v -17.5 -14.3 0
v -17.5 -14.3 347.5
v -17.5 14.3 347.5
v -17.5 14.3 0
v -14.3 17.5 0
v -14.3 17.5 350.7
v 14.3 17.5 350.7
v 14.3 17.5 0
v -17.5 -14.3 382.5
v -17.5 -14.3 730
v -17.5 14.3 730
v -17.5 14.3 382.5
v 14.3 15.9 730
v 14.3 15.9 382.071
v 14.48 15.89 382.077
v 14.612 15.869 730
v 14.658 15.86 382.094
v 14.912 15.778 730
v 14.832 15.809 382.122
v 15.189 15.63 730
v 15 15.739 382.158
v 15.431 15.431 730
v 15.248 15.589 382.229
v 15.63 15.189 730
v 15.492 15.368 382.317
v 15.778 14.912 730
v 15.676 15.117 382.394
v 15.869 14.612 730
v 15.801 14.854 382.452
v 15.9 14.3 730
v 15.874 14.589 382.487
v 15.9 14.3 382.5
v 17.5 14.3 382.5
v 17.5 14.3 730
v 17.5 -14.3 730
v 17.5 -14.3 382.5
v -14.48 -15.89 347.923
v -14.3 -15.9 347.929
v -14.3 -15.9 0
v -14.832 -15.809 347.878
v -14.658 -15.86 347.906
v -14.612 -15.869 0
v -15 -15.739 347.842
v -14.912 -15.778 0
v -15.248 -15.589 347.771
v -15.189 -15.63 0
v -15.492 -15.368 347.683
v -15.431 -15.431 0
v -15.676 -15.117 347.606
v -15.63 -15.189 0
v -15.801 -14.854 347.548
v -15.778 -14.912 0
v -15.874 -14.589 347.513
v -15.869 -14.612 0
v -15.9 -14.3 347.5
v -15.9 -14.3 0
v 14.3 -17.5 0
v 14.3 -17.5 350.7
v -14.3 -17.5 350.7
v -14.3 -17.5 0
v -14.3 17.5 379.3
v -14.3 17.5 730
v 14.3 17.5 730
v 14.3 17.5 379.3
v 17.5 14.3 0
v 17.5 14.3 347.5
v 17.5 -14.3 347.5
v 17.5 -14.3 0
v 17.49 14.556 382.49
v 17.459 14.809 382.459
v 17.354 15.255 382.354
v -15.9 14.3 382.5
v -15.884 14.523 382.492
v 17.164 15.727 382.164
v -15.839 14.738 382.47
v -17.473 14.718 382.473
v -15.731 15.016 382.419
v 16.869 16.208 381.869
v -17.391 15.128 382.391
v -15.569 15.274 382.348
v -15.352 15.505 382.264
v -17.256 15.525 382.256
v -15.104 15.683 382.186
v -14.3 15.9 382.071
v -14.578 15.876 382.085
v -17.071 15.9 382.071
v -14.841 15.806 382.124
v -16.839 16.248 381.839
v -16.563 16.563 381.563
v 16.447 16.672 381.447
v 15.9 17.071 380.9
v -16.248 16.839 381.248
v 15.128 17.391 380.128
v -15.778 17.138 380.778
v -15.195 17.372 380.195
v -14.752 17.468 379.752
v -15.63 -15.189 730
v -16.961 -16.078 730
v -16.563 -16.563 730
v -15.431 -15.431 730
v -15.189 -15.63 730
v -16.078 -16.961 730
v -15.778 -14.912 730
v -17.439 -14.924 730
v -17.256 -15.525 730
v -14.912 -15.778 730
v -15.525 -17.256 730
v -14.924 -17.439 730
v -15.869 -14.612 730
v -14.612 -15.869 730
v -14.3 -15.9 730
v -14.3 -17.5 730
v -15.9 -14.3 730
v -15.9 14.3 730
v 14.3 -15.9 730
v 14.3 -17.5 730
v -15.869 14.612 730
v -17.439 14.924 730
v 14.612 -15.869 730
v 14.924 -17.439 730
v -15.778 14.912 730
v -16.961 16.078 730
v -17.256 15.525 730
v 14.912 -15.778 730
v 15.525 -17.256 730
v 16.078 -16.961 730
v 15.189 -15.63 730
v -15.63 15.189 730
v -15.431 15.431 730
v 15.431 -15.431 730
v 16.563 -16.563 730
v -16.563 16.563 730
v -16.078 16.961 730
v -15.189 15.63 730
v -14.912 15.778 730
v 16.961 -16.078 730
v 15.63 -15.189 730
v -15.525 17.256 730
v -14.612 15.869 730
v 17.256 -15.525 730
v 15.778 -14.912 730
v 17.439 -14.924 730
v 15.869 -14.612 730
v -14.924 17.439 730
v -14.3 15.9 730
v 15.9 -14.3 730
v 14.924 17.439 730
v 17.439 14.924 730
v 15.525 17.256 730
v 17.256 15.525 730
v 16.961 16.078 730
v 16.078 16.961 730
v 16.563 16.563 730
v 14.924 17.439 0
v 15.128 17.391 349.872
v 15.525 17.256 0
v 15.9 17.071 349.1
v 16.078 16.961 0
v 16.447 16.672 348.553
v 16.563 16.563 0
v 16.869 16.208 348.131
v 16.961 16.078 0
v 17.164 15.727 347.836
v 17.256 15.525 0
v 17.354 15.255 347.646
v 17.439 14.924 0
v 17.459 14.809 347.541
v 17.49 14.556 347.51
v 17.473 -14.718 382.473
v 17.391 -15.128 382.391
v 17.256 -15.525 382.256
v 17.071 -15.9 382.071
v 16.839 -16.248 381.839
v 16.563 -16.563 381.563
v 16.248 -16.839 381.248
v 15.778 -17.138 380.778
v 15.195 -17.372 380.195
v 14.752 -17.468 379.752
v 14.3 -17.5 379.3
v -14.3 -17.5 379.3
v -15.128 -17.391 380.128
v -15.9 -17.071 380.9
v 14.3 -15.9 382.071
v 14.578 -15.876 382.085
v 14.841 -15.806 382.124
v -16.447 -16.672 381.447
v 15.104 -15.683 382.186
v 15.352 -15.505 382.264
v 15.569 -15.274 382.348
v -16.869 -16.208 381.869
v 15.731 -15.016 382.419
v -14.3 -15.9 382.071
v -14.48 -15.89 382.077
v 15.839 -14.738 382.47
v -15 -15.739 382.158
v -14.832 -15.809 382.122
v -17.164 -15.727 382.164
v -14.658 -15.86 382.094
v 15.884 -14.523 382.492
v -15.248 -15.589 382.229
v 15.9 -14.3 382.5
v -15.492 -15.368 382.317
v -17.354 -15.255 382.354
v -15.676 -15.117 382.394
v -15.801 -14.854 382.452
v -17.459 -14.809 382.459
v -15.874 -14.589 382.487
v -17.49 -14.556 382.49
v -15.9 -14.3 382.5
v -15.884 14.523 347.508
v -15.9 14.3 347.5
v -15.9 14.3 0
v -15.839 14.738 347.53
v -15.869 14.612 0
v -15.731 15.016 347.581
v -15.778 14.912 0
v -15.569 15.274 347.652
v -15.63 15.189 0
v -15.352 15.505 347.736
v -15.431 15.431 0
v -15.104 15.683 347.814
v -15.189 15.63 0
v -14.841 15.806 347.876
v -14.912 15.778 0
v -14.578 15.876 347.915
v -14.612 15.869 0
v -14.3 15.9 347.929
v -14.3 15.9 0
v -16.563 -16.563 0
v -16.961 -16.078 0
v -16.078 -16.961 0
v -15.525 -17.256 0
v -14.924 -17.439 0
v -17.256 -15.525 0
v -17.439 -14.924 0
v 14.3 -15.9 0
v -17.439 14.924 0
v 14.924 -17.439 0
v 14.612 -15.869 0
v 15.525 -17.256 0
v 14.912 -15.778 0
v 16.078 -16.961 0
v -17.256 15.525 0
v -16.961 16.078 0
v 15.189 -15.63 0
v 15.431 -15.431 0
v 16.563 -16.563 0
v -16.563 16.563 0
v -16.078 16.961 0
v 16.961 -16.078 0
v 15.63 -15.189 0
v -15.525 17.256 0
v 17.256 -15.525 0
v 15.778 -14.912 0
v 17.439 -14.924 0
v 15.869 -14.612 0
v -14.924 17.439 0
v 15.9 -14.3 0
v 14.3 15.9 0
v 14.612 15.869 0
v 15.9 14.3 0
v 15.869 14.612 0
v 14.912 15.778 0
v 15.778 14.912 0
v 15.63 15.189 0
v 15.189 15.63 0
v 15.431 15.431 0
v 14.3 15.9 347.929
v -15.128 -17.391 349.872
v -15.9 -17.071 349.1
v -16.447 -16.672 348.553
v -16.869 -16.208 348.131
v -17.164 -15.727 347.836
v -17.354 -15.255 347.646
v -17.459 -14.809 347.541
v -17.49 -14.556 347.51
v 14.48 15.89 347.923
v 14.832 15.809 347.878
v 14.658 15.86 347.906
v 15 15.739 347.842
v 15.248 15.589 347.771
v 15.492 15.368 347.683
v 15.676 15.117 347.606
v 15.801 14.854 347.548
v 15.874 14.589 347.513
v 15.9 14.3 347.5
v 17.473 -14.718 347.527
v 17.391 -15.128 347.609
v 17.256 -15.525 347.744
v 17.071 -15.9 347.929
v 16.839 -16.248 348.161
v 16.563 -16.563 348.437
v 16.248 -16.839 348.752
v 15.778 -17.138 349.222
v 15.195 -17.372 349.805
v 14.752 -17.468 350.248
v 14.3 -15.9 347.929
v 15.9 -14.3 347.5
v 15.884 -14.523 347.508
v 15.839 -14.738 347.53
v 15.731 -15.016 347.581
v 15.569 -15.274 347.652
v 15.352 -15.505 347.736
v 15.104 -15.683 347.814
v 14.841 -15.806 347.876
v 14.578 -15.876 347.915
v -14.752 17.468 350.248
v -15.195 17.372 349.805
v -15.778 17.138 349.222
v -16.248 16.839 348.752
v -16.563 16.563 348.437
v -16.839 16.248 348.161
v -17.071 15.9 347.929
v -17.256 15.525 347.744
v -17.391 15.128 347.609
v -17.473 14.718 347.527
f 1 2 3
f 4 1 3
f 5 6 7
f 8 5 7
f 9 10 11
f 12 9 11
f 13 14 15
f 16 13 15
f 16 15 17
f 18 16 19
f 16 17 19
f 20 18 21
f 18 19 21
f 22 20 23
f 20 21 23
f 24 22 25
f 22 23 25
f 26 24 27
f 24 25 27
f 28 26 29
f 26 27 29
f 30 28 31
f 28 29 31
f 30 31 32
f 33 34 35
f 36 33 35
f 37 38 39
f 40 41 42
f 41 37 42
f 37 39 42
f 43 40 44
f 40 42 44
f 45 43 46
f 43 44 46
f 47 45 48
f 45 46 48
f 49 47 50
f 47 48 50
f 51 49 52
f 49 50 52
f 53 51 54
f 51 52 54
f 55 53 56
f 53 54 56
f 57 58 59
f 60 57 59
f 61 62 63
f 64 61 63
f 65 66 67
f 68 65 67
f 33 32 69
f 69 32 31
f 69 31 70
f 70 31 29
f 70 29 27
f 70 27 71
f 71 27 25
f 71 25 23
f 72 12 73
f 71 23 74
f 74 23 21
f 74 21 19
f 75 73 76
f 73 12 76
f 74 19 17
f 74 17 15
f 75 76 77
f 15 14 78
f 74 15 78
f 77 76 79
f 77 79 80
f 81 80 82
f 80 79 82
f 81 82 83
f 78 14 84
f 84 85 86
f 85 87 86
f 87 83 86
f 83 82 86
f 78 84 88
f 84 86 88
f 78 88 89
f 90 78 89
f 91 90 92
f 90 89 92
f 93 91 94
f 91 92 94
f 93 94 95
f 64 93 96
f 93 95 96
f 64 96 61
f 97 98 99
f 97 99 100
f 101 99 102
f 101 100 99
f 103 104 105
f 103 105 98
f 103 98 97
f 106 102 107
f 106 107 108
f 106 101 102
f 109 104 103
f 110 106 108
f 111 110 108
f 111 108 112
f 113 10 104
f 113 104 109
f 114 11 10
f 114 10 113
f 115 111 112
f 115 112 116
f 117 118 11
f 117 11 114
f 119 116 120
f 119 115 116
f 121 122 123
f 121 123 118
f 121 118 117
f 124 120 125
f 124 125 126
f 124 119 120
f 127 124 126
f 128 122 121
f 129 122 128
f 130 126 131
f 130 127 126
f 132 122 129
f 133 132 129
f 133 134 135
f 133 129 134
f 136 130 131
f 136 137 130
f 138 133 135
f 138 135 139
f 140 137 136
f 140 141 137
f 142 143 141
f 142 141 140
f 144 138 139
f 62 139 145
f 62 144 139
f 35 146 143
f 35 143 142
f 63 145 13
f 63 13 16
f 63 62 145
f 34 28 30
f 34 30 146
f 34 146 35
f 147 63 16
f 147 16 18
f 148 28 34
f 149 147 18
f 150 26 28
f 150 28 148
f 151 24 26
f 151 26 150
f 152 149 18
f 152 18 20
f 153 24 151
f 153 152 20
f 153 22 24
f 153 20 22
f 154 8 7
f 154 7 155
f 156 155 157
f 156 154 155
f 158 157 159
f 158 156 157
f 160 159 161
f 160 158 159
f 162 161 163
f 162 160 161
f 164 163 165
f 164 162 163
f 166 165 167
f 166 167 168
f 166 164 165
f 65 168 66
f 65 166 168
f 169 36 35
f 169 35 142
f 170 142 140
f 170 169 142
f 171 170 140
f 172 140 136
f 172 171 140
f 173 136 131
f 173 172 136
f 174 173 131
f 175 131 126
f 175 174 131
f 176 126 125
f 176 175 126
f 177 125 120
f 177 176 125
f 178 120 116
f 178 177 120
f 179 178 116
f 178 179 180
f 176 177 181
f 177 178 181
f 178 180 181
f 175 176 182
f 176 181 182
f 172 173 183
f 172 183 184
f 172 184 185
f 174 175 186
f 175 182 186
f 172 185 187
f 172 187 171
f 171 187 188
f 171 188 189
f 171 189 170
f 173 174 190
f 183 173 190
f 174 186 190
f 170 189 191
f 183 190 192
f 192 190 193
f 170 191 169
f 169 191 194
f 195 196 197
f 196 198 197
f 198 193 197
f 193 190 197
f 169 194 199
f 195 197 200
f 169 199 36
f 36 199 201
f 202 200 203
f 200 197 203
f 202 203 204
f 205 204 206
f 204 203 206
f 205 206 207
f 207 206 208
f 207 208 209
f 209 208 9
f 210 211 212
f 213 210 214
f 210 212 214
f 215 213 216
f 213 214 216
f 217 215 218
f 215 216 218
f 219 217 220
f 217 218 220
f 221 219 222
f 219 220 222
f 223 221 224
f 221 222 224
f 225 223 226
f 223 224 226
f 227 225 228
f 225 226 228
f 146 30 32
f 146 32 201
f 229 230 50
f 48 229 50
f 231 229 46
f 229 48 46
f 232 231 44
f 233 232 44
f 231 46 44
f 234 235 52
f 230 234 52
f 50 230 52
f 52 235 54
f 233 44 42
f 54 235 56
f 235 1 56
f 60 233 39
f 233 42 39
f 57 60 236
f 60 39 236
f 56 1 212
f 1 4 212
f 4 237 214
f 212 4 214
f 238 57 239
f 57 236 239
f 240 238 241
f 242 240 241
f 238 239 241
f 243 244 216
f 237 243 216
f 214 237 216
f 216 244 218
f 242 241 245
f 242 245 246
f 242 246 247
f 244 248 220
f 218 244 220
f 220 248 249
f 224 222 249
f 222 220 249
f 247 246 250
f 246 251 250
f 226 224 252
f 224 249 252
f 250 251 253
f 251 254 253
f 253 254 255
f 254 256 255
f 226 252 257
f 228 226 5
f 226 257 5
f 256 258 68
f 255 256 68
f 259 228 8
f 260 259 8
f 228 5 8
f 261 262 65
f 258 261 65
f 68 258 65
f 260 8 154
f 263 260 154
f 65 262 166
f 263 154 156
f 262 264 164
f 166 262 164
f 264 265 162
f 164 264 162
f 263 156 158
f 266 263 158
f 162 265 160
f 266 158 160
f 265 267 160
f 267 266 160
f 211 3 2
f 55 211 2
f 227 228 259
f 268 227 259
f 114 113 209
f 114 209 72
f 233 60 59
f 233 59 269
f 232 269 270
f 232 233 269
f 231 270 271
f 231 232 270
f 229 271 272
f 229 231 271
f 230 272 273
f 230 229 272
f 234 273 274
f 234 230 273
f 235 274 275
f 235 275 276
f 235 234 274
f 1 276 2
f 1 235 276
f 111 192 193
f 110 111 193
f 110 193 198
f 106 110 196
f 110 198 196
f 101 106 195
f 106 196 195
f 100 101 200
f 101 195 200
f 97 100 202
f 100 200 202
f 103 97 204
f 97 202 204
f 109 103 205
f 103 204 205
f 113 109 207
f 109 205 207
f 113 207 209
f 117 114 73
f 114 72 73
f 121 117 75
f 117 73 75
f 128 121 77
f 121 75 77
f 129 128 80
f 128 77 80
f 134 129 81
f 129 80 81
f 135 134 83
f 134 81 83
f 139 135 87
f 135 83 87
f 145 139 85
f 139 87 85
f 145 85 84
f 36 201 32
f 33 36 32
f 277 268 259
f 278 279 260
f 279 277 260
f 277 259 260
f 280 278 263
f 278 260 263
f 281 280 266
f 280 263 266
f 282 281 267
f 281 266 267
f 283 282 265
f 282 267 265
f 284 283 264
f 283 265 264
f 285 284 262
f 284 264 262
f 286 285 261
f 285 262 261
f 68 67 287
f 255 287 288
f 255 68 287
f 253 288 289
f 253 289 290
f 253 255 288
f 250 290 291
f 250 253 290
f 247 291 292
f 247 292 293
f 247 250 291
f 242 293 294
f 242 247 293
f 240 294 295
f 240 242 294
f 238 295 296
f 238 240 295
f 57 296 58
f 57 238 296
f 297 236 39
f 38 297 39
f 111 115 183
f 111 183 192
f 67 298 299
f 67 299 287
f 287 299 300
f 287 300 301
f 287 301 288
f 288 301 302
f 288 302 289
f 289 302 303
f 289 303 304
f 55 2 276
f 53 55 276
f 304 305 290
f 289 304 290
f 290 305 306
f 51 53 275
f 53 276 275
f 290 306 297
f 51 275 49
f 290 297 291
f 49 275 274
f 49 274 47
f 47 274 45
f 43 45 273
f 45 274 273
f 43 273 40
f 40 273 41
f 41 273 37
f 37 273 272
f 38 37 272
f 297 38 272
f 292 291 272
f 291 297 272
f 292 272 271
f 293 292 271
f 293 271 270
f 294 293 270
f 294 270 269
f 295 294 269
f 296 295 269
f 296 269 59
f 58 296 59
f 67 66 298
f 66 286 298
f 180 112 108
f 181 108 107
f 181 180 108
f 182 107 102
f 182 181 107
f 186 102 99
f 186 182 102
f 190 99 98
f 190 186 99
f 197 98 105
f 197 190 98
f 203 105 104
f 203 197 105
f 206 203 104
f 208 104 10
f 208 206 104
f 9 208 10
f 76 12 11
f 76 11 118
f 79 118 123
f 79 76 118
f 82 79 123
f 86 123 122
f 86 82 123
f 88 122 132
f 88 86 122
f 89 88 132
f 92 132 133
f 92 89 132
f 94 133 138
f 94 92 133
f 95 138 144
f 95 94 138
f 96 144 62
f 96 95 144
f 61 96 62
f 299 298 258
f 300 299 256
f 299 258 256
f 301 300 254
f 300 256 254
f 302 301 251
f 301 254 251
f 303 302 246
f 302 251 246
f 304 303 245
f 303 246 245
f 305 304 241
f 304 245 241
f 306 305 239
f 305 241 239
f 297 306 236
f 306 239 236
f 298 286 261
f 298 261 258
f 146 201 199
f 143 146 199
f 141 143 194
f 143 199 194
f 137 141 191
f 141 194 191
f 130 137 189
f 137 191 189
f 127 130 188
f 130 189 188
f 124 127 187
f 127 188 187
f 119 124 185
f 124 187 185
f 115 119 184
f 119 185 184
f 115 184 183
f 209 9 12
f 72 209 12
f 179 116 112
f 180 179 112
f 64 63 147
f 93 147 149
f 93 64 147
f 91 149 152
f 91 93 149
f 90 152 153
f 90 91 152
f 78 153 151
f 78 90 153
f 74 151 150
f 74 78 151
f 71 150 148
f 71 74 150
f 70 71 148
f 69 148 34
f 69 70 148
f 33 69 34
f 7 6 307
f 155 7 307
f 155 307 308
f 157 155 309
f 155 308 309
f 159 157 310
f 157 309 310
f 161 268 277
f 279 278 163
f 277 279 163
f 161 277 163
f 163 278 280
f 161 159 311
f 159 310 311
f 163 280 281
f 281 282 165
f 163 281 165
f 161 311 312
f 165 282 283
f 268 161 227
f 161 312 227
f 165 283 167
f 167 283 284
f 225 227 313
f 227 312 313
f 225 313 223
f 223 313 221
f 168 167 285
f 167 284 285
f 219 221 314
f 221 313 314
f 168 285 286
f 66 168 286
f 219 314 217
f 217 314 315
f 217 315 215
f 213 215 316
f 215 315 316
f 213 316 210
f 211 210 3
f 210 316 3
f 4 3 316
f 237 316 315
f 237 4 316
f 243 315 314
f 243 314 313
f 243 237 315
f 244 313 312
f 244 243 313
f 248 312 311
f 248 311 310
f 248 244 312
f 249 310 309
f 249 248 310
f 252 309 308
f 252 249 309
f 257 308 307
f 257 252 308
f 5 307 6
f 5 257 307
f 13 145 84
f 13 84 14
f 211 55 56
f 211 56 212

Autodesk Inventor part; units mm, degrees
ref_plane "Start plane" through (0, 0, 0) normal (0, 0, 1) x (1, 0, 0)
ref_plane "End plane" through (0, 0, 730) normal (0, 0, 1) x (1, 0, 0)
sketch "Sketch" plane through (0, 0, 0) normal (0, 0, 1) x (1, 0, 0)
  line L0 (-17.5, -14.3) -> (-17.5, 14.3)
  line L1 (-14.3, 17.5) -> (14.3, 17.5)
  line L2 (17.5, 14.3) -> (17.5, -14.3)
  line L3 (14.3, -17.5) -> (-14.3, -17.5)
  arc A0 (-17.5, -14.3) -> (-14.3, -17.5) centre (-14.3, -14.3) ccw
  arc A1 (-14.3, 17.5) -> (-17.5, 14.3) centre (-14.3, 14.3) ccw
  arc A2 (17.5, 14.3) -> (14.3, 17.5) centre (14.3, 14.3) ccw
  arc A3 (14.3, -17.5) -> (17.5, -14.3) centre (14.3, -14.3) ccw
  arc A4 (-14.3, 15.9) -> (-15.9, 14.3) centre (-14.3, 14.3) ccw
  line L4 (-14.3, 15.9) -> (14.3, 15.9)
  arc A5 (15.9, 14.3) -> (14.3, 15.9) centre (14.3, 14.3) ccw
  line L5 (15.9, 14.3) -> (15.9, -14.3)
  arc A6 (14.3, -15.9) -> (15.9, -14.3) centre (14.3, -14.3) ccw
  line L6 (14.3, -15.9) -> (-14.3, -15.9)
  arc A7 (-15.9, -14.3) -> (-14.3, -15.9) centre (-14.3, -14.3) ccw
  line L7 (-15.9, -14.3) -> (-15.9, 14.3)
  line L8 (0, 25.4278) -> (0, -25.4278) construction
  line L9 (-25.4278, 0) -> (25.4278, 0) construction
  dimension "d7" = 3.2
  dimension "d10" = 35
  dimension "d11" = 35
  dimension "d12" = 1.6
  dimension "d15" = 17.5
  dimension "d16" = 17.5
extrude "Body" add sketch "Sketch" along normal up to surface (730 mm away) from surface at 0
sketch "Sketch3" plane through (0, 0, 0) normal (0, 0, 1) x (1, 0, 0)
  line L0 (0, 0) -> (10, 0)
ref_plane "Work Plane3" through (0, 0, 0) normal (0, -1, 0) x (1, 0, 0)
sketch "Sketch4" plane through (0, 0, 0) normal (0, -1, 0) x (1, 0, 0)
  line L0 (-2, 0) -> (12, 0)
  line L1 (-2, 730) -> (12, 730)
  dimension "d18" = 730
ref_plane "Work Plane4" through (-215, 0, 365) normal (1, 0, 0) x (0, 0, -1)
ref_plane "Work Plane5" through (215, 0, 365) normal (1, 0, 0) x (0, 0, -1)
ref_plane "Work Plane6" through (0, 0, 365) normal (1, 0, 0) x (0, 0, -1)
sketch "Sketch5" plane through (0, 0, 365) normal (1, 0, 0) x (0, 0, -1)
  arc A0 (-17.5, -14.3) -> (-14.3, -17.5) centre (-14.3, -14.3) ccw
  line L0 (-17.5, -14.3) -> (-17.5, 14.3)
  arc A1 (-14.3, 17.5) -> (-17.5, 14.3) centre (-14.3, 14.3) ccw
  line L1 (-14.3, 17.5) -> (14.3, 17.5)
  arc A2 (17.5, 14.3) -> (14.3, 17.5) centre (14.3, 14.3) ccw
  line L2 (17.5, 14.3) -> (17.5, -14.3)
  arc A3 (14.3, -17.5) -> (17.5, -14.3) centre (14.3, -14.3) ccw
  line L3 (14.3, -17.5) -> (-14.3, -17.5)
  arc A4 (-14.3, 15.9) -> (-15.9, 14.3) centre (-14.3, 14.3) ccw
  line L4 (-14.3, 15.9) -> (14.3, 15.9)
  arc A5 (15.9, 14.3) -> (14.3, 15.9) centre (14.3, 14.3) ccw
  line L5 (15.9, 14.3) -> (15.9, -14.3)
  arc A6 (14.3, -15.9) -> (15.9, -14.3) centre (14.3, -14.3) ccw
  line L6 (14.3, -15.9) -> (-14.3, -15.9)
  arc A7 (-15.9, -14.3) -> (-14.3, -15.9) centre (-14.3, -14.3) ccw
  line L7 (-15.9, -14.3) -> (-15.9, 14.3)
extrude "Extrusion2" cut sketch "Sketch5" along normal up to surface (430 mm away) from surface at -215 contours L0 A1 L1 A2 L2 A3 L3 A0 | L4 A5 L5 A6 L6 A7 L7 A4
equation "\"d7\" = G_IR"
equation "\"d10\" = G_H"
equation "\"d11\" = G_W"
equation "\"d12\" = G_T"
equation "\"d15\" = 0.5 * d10"
equation "\"d16\" = 0.5 * d11"
equation "\"d3\" = G_L"
equation "\"G_W\" = 35"
equation "\"G_H\" = 35"
equation "\"G_T\" = 1.6"
equation "\"G_IR\" = 3.2"
equation "\"G_L\" = d18"
equation "\"G_OFFSET_START\" = 0"
equation "\"G_OFFSET_END\" = 0"
properties part number "AS 1163 - C350L0 35x35x1.6 SHS - 730" material "Steel, Mild"
